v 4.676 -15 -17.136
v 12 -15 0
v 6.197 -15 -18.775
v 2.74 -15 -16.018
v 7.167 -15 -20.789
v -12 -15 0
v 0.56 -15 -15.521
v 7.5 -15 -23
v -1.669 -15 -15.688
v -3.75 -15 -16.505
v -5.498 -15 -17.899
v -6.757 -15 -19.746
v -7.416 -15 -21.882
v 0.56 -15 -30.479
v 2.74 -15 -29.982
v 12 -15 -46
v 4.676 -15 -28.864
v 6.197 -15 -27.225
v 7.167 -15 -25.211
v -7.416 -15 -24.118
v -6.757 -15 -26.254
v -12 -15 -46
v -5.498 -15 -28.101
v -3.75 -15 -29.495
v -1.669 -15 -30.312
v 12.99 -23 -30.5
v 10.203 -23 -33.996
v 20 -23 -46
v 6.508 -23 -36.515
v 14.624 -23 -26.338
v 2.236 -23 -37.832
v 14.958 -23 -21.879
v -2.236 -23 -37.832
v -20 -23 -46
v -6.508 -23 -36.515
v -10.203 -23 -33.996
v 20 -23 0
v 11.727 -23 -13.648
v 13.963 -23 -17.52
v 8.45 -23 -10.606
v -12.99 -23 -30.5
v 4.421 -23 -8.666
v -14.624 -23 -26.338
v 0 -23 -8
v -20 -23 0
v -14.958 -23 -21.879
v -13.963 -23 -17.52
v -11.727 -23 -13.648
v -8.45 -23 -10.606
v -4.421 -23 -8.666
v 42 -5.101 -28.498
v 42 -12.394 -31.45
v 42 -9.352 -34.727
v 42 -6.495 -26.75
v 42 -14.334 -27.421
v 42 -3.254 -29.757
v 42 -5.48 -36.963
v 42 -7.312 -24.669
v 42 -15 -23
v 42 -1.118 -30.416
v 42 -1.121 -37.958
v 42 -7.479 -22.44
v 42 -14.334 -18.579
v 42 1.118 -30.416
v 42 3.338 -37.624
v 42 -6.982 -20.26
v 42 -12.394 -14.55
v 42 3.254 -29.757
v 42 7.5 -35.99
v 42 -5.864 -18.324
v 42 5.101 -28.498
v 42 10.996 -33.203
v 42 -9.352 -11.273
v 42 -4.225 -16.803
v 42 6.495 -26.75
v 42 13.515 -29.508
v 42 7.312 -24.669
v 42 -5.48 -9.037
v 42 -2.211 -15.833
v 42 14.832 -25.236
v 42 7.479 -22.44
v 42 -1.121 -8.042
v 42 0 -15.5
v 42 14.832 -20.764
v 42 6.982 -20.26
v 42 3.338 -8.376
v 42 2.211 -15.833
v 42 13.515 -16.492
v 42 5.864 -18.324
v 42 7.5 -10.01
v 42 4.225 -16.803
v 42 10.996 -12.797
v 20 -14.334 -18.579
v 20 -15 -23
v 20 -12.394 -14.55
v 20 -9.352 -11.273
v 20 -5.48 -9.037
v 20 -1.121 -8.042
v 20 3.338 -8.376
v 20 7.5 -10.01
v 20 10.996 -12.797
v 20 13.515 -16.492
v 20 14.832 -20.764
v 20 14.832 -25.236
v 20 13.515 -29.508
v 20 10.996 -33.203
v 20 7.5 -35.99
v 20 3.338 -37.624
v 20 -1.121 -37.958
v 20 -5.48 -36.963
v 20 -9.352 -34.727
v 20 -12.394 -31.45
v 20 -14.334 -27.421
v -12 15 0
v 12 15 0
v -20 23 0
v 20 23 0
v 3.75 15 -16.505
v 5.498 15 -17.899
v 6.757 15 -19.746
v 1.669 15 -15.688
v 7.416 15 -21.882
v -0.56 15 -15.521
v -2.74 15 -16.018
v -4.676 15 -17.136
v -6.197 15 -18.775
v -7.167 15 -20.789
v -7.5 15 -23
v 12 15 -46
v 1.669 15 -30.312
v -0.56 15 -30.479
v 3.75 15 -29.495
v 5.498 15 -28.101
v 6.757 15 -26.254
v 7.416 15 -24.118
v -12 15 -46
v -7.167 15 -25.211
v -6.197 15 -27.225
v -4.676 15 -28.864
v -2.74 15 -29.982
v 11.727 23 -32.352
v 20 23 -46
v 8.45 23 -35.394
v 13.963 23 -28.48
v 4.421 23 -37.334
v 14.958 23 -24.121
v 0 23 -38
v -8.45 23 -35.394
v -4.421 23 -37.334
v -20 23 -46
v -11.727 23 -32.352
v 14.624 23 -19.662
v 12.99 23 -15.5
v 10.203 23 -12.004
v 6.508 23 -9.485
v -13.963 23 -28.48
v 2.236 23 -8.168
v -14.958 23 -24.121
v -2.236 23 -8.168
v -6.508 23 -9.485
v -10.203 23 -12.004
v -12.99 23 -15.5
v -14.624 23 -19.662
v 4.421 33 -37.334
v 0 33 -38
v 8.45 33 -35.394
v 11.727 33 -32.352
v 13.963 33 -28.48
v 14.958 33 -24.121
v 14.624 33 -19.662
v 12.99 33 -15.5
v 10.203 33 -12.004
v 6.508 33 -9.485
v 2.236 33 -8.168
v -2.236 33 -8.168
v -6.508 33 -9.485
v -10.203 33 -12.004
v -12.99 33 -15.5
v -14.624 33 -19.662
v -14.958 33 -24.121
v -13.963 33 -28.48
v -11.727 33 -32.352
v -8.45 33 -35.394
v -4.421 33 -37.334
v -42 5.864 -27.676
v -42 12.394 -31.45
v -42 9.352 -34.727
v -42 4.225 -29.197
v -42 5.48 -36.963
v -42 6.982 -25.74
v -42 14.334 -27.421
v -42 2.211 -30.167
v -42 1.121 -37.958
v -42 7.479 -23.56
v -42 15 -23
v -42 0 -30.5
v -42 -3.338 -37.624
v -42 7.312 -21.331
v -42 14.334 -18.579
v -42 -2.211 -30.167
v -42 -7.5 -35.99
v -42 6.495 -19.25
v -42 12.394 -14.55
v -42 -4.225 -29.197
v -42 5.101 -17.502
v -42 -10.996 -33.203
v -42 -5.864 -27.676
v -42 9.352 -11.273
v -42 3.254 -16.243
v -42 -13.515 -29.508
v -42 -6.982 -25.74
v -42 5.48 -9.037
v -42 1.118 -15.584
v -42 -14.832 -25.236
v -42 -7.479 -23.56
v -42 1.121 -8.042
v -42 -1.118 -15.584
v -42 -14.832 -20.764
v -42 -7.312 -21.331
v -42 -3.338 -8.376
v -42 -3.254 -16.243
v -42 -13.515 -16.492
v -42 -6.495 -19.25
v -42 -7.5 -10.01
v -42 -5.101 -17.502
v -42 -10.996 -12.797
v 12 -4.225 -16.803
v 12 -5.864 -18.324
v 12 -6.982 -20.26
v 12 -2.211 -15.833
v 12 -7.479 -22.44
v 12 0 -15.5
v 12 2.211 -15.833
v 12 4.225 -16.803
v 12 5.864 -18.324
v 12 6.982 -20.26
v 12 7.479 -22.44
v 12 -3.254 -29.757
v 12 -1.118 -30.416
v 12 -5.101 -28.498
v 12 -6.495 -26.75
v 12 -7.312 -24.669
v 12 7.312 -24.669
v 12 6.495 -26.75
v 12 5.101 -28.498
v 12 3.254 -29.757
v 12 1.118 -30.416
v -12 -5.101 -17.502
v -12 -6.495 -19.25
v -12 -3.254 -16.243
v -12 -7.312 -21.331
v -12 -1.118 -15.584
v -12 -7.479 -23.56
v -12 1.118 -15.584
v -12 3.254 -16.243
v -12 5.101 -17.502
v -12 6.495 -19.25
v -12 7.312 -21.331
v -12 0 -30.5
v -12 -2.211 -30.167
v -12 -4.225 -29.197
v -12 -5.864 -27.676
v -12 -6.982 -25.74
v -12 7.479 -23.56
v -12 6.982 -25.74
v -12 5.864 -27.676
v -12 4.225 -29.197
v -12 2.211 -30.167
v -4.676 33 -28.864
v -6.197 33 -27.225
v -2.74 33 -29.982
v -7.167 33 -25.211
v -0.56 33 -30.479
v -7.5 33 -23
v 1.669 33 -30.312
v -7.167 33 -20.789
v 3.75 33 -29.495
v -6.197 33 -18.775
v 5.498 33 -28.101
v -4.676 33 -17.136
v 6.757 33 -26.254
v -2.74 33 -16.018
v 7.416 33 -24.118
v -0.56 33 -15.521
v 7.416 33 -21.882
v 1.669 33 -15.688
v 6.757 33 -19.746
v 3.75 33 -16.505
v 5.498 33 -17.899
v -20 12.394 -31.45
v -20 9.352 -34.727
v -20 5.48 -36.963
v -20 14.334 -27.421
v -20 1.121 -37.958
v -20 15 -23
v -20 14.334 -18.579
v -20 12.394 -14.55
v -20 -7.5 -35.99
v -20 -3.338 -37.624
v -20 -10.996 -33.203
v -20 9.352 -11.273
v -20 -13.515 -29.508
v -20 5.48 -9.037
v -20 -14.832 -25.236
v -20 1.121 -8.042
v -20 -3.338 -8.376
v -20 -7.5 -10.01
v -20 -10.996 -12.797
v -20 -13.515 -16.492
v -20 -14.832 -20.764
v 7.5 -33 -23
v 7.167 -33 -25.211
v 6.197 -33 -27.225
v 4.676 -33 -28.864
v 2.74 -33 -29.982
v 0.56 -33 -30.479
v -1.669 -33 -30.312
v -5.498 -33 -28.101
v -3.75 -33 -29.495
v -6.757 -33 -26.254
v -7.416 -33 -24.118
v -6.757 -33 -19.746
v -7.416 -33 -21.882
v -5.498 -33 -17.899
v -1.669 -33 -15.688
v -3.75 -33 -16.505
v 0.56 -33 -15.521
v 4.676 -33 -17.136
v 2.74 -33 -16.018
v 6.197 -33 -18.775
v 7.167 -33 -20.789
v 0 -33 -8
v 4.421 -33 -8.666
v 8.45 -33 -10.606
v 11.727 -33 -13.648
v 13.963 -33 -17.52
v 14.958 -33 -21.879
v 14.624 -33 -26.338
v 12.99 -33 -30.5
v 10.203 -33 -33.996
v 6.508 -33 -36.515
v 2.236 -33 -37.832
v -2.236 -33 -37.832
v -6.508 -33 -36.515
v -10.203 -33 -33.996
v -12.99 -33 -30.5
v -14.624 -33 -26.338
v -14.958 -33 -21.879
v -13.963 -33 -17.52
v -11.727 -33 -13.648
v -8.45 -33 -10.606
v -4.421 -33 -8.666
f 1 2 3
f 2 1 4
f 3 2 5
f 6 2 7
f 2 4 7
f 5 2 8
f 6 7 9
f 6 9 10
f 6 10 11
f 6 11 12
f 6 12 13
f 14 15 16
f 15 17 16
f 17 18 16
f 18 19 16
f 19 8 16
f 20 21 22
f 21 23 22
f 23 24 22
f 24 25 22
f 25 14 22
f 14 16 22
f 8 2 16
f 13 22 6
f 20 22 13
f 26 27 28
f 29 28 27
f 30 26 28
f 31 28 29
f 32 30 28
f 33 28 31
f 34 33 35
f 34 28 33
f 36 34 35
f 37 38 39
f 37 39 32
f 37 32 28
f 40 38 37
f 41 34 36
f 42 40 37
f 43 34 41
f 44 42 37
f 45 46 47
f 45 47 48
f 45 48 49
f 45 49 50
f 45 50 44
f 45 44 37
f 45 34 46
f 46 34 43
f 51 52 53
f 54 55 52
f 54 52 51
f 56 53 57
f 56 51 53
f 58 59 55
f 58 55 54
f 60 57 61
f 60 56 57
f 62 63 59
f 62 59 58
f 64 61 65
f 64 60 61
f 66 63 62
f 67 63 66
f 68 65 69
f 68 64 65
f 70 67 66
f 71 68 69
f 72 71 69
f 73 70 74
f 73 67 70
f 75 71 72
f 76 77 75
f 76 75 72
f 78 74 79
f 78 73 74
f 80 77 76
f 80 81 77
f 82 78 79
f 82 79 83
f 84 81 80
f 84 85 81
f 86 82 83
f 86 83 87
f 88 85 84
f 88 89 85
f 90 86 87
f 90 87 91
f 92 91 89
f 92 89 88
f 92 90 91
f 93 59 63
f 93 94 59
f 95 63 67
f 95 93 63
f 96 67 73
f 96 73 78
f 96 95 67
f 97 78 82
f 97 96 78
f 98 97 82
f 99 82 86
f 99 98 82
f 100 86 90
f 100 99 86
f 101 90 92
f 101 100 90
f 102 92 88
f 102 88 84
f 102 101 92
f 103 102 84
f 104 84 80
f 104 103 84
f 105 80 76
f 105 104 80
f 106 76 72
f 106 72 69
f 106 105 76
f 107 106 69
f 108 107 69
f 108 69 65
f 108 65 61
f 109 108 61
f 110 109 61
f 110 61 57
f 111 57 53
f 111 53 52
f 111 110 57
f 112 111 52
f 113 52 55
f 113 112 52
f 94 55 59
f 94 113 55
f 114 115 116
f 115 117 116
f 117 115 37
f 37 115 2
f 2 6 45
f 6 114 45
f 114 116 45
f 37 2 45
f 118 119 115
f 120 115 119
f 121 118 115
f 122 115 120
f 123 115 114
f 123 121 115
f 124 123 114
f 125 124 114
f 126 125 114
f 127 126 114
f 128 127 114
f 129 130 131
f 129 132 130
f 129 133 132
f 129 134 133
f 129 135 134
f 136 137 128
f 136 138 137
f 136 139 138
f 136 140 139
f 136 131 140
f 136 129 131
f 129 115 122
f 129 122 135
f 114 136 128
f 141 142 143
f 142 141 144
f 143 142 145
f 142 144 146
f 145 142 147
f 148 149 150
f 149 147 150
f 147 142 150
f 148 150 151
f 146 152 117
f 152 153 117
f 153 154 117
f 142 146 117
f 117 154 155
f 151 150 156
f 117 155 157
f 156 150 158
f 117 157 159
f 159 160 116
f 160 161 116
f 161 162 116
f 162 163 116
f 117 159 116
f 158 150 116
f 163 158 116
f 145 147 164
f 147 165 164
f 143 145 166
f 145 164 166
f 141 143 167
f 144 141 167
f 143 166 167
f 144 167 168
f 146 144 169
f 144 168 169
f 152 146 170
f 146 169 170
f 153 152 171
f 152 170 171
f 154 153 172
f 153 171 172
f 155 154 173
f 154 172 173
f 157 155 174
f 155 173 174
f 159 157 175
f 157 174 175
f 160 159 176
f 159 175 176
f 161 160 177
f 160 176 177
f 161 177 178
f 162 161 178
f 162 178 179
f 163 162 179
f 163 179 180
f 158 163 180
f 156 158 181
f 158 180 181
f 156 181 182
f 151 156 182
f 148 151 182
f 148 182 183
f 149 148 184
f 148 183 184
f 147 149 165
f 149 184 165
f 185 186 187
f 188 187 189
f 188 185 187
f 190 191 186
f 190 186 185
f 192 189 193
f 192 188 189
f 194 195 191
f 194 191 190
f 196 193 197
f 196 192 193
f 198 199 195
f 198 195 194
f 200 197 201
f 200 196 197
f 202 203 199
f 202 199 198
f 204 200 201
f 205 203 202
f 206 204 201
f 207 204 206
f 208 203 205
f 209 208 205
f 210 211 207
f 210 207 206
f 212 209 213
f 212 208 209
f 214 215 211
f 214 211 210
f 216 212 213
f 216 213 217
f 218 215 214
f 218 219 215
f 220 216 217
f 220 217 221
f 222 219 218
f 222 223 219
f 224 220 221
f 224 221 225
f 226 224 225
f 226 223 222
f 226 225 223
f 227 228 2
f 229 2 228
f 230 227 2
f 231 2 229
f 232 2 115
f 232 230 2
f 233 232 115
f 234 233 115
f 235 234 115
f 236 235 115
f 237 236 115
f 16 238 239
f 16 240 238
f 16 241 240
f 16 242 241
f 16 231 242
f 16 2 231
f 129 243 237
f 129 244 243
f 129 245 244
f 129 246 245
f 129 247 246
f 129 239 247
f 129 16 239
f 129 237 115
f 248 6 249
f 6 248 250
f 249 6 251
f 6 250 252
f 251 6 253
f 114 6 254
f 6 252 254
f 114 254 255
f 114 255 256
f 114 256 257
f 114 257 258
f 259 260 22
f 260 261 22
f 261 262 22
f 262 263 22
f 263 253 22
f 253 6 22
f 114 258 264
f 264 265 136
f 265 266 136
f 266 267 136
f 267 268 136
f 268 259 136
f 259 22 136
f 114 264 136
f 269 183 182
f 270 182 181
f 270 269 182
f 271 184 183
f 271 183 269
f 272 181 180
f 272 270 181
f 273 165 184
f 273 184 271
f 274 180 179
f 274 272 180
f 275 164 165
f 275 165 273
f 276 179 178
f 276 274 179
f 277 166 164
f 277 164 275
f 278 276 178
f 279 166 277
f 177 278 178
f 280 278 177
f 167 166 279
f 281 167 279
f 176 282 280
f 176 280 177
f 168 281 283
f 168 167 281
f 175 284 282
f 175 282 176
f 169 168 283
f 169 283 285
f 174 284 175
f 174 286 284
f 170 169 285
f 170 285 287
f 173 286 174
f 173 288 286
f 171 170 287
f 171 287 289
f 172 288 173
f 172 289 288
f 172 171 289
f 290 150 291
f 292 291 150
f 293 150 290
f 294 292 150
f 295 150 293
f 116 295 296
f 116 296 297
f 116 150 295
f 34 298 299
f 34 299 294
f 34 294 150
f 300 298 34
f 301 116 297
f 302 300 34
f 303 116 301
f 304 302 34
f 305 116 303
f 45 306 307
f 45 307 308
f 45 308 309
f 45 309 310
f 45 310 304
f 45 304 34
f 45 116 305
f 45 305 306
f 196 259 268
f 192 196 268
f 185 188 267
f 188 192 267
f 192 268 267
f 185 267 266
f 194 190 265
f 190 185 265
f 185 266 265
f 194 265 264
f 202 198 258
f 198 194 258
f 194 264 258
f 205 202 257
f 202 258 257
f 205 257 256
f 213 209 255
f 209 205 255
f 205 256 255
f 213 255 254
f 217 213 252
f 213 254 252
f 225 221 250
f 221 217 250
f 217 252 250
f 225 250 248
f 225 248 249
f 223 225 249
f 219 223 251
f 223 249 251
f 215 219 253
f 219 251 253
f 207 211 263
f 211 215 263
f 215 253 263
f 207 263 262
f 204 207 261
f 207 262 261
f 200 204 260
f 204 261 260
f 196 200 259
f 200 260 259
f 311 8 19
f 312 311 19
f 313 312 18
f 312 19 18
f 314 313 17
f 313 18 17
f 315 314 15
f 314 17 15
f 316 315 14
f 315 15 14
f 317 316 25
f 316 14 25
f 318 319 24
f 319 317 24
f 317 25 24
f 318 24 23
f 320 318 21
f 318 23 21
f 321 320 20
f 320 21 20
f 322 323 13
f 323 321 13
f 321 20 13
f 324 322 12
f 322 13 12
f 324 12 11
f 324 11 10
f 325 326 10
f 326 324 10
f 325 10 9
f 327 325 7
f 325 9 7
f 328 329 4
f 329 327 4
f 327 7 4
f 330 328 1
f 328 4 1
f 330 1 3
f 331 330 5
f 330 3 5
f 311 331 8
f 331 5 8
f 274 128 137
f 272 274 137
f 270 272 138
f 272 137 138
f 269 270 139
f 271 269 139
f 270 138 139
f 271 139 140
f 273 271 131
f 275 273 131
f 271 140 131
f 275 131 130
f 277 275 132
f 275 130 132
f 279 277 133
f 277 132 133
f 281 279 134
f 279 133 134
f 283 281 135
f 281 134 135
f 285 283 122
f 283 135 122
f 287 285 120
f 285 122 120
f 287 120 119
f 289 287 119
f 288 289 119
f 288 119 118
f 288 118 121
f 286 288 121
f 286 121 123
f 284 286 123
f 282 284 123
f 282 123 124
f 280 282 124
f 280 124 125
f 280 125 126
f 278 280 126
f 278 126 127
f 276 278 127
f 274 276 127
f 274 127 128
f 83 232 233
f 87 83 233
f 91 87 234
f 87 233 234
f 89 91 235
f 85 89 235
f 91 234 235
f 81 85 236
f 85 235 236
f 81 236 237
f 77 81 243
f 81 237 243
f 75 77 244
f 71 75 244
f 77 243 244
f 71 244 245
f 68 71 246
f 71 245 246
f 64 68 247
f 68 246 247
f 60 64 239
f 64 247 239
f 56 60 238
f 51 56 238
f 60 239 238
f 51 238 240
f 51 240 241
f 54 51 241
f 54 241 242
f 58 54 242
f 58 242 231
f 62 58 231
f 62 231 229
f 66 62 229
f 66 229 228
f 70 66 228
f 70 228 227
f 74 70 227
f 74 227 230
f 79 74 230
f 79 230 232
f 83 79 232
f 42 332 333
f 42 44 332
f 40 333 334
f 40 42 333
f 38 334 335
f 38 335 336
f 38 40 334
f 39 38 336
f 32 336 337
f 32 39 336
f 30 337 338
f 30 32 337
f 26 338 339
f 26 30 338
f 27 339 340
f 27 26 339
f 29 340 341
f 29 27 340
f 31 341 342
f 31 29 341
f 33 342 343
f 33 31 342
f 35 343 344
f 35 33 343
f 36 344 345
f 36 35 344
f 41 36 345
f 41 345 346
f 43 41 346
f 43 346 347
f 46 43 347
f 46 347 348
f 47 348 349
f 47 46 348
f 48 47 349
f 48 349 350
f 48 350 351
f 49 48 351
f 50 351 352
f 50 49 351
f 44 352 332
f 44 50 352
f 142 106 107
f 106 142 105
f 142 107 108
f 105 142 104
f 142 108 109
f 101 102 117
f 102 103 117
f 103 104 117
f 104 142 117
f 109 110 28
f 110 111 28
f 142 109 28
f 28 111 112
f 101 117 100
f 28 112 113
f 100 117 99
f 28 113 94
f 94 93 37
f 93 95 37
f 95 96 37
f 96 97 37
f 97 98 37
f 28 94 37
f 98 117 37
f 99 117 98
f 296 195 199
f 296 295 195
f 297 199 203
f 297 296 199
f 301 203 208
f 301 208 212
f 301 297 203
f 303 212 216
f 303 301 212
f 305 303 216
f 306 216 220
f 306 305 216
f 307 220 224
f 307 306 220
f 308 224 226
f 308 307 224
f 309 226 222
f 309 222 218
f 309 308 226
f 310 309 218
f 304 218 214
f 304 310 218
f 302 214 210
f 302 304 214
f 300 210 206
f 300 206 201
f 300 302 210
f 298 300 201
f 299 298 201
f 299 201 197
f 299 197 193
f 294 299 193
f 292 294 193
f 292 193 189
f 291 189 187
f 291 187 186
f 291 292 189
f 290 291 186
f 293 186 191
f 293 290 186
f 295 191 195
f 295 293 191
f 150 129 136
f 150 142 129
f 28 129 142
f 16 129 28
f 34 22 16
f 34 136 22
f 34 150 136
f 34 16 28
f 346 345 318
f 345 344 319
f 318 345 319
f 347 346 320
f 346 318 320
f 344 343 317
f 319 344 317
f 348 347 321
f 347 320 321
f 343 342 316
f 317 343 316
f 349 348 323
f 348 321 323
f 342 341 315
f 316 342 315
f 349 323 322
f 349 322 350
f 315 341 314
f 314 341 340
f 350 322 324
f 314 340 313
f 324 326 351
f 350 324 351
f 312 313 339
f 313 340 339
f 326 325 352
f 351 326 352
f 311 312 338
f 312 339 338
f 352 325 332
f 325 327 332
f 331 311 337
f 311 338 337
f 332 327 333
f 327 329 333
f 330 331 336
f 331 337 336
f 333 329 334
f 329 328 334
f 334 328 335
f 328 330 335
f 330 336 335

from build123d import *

# Parameters (mm, degrees)
SKETCH1_W                      = 46
SKETCH1_H                      = 46
BOSS_EXTRUDE1_DEPTH            = 40
SKETCH2_W                      = 24
SKETCH2_H                      = 30
CUT_EXTRUDE1_DEPTH             = 56.181518645
SKETCH3_W                      = 15
SKETCH3_H                      = 10
SKETCH4_W                      = 15
SKETCH4_H                      = 10
SKETCH5_W                      = 22
SKETCH5_H                      = 15
SKETCH6_W                      = 22
SKETCH6_H                      = 15
F_15_0_15_DIAMETER_HOLE1_D     = 15
F_15_0_15_DIAMETER_HOLE1_DEPTH = 18
F_15_0_15_DIAMETER_HOLE2_D     = 15
F_15_0_15_DIAMETER_HOLE2_DEPTH = 66
F_15_0_15_DIAMETER_HOLE3_D     = 15
F_15_0_15_DIAMETER_HOLE3_DEPTH = 30
F_15_0_15_DIAMETER_HOLE4_D     = 15
F_15_0_15_DIAMETER_HOLE4_DEPTH = 84


with BuildPart() as part:
    # Sketch1 → Boss-Extrude1 (new body)
    with BuildSketch(Plane(origin=(-20, 0, 0), x_dir=(0, -1, 0), z_dir=(-1, 0, 0))):
        with Locations((0, -23)):
            Rectangle(SKETCH1_W, SKETCH1_H)
    extrude(amount=-BOSS_EXTRUDE1_DEPTH)

    # Sketch2 → Cut-Extrude1 (cut, through all)
    with BuildSketch(Plane(origin=(0, 0, -46), x_dir=(-1, 0, 0), z_dir=(0, 0, -1))):
        Rectangle(SKETCH2_W, SKETCH2_H)
    extrude(amount=-CUT_EXTRUDE1_DEPTH, mode=Mode.SUBTRACT)

    # Sketch3 → Revolve1 (revolve)
    with BuildSketch(Plane(origin=(0, 0, -23), x_dir=(-1, 0, 0), z_dir=(0, 0, -1)), mode=Mode.PRIVATE) as revolve1_sk:
        with Locations((-7.5, -28)):
            Rectangle(SKETCH3_W, SKETCH3_H)
    revolve(revolve1_sk.sketch.rotate(Axis((0, -33, -23), (0, 1, 0)), 270), axis=Axis((0, -33, -23), (0, 1, 0)))

    # Sketch4 → Revolve2 (revolve)
    with BuildSketch(Plane.XY.offset(-23), mode=Mode.PRIVATE) as revolve2_sk:
        with Locations((7.5, 28)):
            Rectangle(SKETCH4_W, SKETCH4_H)
    revolve(revolve2_sk.sketch.rotate(Axis((0, 33, -23), (0, -1, 0)), 270), axis=Axis((0, 33, -23), (0, -1, 0)))

    # Sketch5 → Revolve3 (revolve)
    with BuildSketch(Plane.XY.offset(-23)):
        with Locations((-31, 7.5)):
            Rectangle(SKETCH5_W, SKETCH5_H)
    revolve(axis=Axis((-42, 0, -23), (1, 0, 0)))

    # Sketch6 → Revolve4 (revolve)
    with BuildSketch(Plane(origin=(0, 0, -23), x_dir=(-1, 0, 0), z_dir=(0, 0, -1)), mode=Mode.PRIVATE) as revolve4_sk:
        with Locations((-31, 7.5)):
            Rectangle(SKETCH6_W, SKETCH6_H)
    revolve(revolve4_sk.sketch.rotate(Axis((42, 0, -23), (-1, 0, 0)), 180), axis=Axis((42, 0, -23), (-1, 0, 0)))

    # Ø15.0 (15) Diameter Hole1
    with Locations(Plane(origin=(0, -33, 0), x_dir=(-1, 0, 0), z_dir=(0, -1, 0))):
        with Locations((0, 23)):
            Hole(F_15_0_15_DIAMETER_HOLE1_D / 2, depth=F_15_0_15_DIAMETER_HOLE1_DEPTH)

    # Ø15.0 (15) Diameter Hole2
    with Locations(Plane(origin=(0, 33, 0), x_dir=(1, 0, 0), z_dir=(0, 1, 0))):
        with Locations((0, 23)):
            Hole(F_15_0_15_DIAMETER_HOLE2_D / 2, depth=F_15_0_15_DIAMETER_HOLE2_DEPTH)

    # Ø15.0 (15) Diameter Hole3
    with Locations(Plane.ZY.offset(42)):
        with Locations((-23, 0)):
            Hole(F_15_0_15_DIAMETER_HOLE3_D / 2, depth=F_15_0_15_DIAMETER_HOLE3_DEPTH)

    # Ø15.0 (15) Diameter Hole4
    with Locations(Plane(origin=(42, 0, 0), x_dir=(0, 0, -1), z_dir=(1, 0, 0))):
        with Locations((23, 0)):
            Hole(F_15_0_15_DIAMETER_HOLE4_D / 2, depth=F_15_0_15_DIAMETER_HOLE4_DEPTH)


solid = part.part
